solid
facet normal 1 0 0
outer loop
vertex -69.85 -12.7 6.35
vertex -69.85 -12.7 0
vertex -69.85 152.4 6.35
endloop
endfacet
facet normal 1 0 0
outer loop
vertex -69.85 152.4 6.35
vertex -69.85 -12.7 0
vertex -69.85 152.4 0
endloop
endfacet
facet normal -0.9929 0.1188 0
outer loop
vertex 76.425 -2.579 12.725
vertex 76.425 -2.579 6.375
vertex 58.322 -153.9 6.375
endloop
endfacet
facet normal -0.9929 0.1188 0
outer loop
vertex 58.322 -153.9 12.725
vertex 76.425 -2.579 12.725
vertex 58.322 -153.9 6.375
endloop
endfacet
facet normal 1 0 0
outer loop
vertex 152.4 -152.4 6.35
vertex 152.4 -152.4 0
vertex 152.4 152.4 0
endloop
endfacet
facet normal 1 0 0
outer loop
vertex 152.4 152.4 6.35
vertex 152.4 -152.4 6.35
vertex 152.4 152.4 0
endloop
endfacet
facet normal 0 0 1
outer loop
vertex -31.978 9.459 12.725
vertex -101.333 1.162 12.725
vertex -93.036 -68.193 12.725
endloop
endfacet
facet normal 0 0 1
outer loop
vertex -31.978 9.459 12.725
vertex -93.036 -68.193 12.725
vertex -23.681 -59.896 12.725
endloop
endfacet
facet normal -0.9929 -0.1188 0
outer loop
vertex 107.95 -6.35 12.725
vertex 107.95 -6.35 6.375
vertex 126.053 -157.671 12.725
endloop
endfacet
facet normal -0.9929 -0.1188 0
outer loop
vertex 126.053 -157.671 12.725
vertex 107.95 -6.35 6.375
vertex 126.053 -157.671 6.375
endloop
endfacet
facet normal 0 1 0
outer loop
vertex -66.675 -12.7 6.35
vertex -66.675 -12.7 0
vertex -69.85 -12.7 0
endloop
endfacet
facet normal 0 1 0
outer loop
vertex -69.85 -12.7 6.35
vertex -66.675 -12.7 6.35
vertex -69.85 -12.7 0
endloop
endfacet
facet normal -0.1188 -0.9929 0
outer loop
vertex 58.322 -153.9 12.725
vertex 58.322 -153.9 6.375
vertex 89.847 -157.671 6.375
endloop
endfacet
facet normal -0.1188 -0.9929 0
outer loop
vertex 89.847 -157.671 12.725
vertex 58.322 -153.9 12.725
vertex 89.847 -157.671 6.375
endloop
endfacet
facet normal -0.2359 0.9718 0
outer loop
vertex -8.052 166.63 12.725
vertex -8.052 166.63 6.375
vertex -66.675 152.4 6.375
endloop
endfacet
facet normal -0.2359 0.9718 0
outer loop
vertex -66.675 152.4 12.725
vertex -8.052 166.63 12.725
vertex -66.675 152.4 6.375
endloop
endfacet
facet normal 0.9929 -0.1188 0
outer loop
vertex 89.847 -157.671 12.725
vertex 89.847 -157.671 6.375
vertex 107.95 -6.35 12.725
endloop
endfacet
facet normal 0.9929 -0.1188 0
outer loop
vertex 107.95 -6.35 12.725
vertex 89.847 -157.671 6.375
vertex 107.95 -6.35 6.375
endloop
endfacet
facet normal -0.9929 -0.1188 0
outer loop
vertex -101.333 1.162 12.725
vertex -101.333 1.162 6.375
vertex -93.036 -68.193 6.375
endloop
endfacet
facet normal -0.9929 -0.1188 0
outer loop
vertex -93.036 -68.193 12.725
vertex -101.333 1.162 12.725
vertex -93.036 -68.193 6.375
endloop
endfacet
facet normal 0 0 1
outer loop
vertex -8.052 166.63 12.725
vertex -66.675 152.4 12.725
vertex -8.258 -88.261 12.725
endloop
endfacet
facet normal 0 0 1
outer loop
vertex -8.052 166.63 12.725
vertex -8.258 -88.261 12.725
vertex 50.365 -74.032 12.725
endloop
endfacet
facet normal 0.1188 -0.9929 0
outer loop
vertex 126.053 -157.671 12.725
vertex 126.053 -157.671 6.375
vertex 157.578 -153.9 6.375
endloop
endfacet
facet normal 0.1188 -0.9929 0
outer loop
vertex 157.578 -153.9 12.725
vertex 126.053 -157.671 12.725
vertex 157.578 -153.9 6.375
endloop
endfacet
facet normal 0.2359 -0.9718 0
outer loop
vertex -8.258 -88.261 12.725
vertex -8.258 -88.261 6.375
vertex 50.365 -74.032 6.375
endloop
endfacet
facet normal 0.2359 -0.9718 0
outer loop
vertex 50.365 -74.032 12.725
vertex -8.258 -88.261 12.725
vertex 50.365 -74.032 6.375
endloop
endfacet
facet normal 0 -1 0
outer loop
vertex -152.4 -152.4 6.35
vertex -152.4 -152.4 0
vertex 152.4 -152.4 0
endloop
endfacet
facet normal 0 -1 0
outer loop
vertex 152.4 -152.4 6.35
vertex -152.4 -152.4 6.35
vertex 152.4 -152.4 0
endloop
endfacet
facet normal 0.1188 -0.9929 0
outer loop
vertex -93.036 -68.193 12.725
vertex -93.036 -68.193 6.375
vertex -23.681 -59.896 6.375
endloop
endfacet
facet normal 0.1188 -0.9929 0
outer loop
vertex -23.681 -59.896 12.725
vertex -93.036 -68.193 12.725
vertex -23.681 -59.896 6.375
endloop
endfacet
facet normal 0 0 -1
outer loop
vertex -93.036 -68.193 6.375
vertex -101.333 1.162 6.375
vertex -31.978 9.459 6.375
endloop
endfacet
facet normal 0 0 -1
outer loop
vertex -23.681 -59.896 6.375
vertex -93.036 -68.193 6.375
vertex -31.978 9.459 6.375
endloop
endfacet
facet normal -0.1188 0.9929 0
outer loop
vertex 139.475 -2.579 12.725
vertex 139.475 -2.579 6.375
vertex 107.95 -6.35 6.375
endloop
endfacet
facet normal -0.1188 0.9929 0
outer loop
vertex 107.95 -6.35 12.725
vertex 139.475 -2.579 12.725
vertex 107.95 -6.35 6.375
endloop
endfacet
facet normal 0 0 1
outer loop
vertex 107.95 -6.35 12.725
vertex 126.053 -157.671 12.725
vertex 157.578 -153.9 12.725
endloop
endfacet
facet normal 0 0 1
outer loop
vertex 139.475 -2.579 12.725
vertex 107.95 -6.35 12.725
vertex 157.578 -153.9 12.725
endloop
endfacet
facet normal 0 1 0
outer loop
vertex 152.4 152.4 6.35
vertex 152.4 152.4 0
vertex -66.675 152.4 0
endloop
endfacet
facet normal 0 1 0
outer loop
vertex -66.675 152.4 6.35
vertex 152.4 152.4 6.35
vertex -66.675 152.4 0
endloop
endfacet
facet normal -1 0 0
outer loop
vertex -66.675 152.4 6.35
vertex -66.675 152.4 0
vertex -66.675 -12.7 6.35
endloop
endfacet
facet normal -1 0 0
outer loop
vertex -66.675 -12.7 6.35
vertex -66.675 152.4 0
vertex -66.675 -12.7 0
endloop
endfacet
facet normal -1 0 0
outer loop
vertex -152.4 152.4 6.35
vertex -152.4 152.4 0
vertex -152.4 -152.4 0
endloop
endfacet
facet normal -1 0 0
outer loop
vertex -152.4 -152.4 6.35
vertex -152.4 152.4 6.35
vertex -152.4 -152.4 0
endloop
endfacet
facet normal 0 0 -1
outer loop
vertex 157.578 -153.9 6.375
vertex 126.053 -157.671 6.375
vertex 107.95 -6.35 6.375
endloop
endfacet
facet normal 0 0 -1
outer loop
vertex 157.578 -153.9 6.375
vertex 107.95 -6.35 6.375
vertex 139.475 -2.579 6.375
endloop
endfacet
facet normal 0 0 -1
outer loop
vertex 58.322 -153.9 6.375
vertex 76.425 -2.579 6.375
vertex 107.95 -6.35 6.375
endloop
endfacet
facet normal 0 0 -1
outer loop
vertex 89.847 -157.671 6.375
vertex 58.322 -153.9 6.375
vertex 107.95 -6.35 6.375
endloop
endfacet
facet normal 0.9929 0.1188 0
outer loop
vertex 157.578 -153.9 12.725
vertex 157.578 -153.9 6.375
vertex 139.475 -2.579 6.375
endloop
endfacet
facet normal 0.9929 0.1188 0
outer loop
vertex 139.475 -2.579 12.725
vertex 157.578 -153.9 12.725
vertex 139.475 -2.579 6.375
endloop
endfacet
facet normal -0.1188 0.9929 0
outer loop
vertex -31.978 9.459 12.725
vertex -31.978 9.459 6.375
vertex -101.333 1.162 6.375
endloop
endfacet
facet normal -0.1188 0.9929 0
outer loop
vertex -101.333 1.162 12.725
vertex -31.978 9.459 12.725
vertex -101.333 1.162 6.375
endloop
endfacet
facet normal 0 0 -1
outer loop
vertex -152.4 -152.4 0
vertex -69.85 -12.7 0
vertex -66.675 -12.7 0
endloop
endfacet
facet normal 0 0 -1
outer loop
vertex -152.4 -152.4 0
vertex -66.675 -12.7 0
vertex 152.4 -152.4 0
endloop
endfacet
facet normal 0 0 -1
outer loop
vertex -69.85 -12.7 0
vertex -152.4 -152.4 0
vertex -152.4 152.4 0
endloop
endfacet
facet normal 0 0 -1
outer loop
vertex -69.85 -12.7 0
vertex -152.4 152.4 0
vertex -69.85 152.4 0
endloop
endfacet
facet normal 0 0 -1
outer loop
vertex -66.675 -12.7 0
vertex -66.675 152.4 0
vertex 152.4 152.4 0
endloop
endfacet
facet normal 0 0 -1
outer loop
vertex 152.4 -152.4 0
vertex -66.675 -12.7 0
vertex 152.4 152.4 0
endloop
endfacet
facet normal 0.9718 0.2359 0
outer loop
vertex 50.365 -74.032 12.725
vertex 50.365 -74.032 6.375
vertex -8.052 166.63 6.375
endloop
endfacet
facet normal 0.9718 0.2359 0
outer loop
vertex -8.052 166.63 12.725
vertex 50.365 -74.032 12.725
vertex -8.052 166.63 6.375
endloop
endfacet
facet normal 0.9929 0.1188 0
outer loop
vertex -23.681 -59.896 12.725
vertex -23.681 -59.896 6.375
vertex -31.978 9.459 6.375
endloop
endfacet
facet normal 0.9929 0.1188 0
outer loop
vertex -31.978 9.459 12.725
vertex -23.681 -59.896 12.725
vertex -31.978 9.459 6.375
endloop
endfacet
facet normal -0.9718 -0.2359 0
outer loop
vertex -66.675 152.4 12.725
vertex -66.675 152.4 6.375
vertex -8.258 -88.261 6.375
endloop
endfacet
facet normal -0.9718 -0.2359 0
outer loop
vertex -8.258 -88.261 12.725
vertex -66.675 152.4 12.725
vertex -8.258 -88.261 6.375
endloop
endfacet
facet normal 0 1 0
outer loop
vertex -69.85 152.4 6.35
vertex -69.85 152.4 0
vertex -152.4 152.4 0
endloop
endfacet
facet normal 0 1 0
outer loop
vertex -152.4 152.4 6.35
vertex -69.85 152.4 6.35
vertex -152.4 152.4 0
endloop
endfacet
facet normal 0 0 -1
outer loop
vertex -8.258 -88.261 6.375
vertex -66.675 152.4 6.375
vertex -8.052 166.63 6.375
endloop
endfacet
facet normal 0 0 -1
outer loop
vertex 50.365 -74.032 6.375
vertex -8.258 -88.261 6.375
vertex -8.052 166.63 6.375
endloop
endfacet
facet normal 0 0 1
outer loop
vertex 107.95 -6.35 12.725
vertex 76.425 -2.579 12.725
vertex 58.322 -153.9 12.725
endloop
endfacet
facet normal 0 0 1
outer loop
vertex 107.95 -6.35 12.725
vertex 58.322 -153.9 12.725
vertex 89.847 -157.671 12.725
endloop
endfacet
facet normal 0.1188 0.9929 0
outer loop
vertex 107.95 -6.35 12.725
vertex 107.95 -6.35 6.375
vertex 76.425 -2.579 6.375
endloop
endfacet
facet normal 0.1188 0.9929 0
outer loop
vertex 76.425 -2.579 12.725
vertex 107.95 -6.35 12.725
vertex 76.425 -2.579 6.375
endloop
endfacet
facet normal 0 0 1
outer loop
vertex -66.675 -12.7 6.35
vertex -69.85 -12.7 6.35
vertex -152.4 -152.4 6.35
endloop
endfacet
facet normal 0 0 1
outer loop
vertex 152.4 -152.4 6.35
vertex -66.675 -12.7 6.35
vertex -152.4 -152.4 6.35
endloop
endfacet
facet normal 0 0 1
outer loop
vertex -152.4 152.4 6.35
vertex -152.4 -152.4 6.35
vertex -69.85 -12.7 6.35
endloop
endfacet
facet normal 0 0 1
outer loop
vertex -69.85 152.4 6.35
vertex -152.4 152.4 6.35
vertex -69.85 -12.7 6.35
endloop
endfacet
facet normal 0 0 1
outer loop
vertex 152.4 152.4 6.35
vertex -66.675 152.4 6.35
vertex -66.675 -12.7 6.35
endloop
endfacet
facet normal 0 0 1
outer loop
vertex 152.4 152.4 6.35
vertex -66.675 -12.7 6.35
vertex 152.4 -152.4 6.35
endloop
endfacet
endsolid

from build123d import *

# Parameters (mm, degrees)
F1_DEPTH = 6.35
F5_DEPTH = 6.35
F7_DEPTH = 6.35
F9_DEPTH = 6.35


with BuildPart() as f1:
    # F0 (on Top) → F1 (new body)
    with BuildSketch(Plane.XY):
        Polygon((-152.4, -152.4), (152.4, -152.4), (152.4, 152.4), (-66.675, 152.4), (-66.675, -12.7), (-69.85, -12.7), (-69.85, 152.4), (-152.4, 152.4), align=None)
    extrude(amount=F1_DEPTH)


with BuildPart() as f5:
    # F4 (on offset) → F5 (new body)
    with BuildSketch(Plane.XY.offset(6.3754)):
        Polygon((-8.0523446654, 166.6298948175), (-66.675, 152.4), (-31.9780227839, 9.4594538767), (-8.2575370649, -88.2614271632), (50.3651182697, -74.0315323457), align=None)
    extrude(amount=F5_DEPTH)


with BuildPart() as f7:
    # F6 (on offset) → F7 (new body)
    with BuildSketch(Plane.XY.offset(6.3754)):
        Polygon((-23.6809195366, -59.8960115006), (-31.9780227839, 9.4594538767), (-66.675, 5.3086), (-101.3334881612, 1.1623506294), (-93.0363849139, -68.1931147479), align=None)
    extrude(amount=F7_DEPTH)


with BuildPart() as f9:
    # F8 (on offset) → F9 (new body)
    with BuildSketch(Plane.XY.offset(6.3754)):
        Polygon((139.4752115351, -2.578589433), (107.95, -6.35), (126.0527707214, -157.6710153687), (157.5779822566, -153.8996048017), align=None)
    extrude(amount=F9_DEPTH)


with BuildPart() as f9b:
    # F8 (on offset) → F9, piece 2 (new body)
    with BuildSketch(Plane.XY.offset(6.3754)):
        Polygon((89.8472292786, -157.6710153687), (107.95, -6.35), (76.4247884649, -2.578589433), (58.3220177434, -153.8996048017), align=None)
    extrude(amount=F9_DEPTH)


solid = Compound([f1.part, f5.part, f7.part, f9.part, f9b.part])
